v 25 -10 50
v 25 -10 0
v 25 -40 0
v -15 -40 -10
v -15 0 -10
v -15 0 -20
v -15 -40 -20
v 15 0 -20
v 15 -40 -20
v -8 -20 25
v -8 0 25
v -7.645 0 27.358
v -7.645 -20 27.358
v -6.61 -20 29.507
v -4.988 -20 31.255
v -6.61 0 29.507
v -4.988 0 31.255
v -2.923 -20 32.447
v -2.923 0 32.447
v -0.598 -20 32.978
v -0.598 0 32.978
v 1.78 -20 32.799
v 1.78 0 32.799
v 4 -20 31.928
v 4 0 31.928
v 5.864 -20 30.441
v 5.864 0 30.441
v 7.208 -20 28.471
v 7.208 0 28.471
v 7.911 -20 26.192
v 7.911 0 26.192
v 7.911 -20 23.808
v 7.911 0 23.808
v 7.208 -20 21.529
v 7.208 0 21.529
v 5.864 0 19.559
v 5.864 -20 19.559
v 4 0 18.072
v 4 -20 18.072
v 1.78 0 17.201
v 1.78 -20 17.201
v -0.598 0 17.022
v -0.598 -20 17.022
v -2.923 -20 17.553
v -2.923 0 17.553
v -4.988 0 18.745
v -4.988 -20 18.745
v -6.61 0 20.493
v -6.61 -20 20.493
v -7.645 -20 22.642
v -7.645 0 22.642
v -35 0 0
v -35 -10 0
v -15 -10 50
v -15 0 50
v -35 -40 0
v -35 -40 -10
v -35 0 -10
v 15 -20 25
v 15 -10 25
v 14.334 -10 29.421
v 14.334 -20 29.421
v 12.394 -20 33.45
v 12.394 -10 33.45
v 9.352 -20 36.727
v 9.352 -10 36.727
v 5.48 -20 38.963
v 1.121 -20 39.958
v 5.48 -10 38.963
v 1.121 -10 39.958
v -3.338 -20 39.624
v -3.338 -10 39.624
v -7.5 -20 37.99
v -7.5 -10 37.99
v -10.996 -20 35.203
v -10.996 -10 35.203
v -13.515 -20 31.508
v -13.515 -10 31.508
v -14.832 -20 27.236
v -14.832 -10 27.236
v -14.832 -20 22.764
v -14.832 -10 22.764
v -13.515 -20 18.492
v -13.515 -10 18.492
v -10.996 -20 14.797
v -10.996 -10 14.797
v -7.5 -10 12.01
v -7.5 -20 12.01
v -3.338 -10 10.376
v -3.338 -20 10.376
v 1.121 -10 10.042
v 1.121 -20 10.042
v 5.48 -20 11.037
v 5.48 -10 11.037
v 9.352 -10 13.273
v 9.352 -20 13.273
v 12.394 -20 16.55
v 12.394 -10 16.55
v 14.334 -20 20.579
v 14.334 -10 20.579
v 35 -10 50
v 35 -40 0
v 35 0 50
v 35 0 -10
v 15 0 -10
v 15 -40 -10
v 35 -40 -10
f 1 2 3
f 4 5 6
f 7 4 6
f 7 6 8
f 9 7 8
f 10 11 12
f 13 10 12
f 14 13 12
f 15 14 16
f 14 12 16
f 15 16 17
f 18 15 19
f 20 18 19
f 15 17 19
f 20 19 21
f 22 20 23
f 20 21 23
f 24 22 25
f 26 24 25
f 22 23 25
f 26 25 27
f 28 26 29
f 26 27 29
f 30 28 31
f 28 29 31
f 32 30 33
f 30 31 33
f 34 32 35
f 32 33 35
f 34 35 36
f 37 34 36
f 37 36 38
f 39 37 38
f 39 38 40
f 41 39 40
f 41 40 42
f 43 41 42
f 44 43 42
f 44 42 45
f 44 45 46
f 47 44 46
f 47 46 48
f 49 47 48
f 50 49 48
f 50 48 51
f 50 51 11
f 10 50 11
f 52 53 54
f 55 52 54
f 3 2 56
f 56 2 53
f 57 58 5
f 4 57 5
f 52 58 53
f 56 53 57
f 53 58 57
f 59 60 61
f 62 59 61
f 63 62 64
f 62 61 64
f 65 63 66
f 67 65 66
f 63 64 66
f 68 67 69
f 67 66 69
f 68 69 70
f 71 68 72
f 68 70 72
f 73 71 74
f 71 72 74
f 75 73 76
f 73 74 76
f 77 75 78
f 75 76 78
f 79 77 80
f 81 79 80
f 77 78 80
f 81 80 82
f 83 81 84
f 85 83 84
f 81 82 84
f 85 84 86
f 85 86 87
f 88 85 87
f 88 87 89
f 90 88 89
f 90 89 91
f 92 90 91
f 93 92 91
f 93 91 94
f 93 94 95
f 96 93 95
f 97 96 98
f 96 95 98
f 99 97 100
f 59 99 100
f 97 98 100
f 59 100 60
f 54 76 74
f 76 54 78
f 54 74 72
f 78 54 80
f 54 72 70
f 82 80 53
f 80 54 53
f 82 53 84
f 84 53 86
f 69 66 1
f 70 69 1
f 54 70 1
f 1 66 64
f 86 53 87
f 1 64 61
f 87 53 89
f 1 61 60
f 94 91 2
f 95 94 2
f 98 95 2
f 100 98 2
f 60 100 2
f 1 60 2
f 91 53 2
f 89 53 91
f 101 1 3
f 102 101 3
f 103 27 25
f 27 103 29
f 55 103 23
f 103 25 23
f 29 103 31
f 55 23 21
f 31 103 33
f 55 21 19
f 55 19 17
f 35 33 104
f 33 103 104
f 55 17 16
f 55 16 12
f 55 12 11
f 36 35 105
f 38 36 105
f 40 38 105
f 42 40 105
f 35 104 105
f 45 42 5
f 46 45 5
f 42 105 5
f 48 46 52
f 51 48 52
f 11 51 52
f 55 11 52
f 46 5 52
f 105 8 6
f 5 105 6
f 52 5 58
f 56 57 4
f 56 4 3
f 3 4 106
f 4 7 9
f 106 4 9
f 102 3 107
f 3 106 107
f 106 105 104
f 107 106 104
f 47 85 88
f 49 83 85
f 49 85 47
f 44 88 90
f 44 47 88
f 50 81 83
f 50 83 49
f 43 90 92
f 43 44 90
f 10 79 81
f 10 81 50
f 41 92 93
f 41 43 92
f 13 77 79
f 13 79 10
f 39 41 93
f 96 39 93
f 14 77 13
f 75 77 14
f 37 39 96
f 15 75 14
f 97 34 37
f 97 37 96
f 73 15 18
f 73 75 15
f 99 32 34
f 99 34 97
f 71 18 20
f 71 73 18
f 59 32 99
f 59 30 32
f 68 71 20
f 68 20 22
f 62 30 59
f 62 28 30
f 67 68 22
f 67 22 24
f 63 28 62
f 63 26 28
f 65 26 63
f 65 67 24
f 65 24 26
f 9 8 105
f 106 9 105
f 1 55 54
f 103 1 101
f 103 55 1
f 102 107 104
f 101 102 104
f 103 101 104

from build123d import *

# Parameters (mm, degrees)
F1_DEPTH = 40
F3_DEPTH = 50
F5_DEPTH = 10
F7_DEPTH = 10
F8_R     = 15
F9_DEPTH = 10
F11_D    = 16


with BuildPart() as f1:
    # F0 (on Front) → F1 (new body)
    with BuildSketch(Plane.XZ):
        Polygon((35, 0), (-35, 0), (-35, -10), (-15, -10), (-15, -20), (15, -20), (15, -10), (35, -10), align=None)
    extrude(amount=F1_DEPTH)

    # F2 (on face) → F3 (join)
    with BuildSketch(Plane.XY):
        Polygon((35, 0), (-35, 0), (-35, -10), (25, -10), (25, -40), (35, -40), align=None)
    extrude(amount=F3_DEPTH)

    # F4 (on face) → F5 (cut, through all)
    with BuildSketch(Plane.XZ.offset(10)):
        Polygon((-15, 50), (-35, 50), (-35, 0), align=None)
    extrude(amount=-F5_DEPTH, mode=Mode.SUBTRACT)

    # F6 (on face) → F7 (cut, through all)
    with BuildSketch(Plane(origin=(25, 0, 0), x_dir=(0, -1, 0), z_dir=(-1, 0, 0))):
        Polygon((40, 50), (10, 50), (40, 0), align=None)
    extrude(amount=-F7_DEPTH, mode=Mode.SUBTRACT)

    # F8 (on face) → F9 (join)
    with BuildSketch(Plane.XZ.offset(10)):
        with Locations((0, 25)):
            Circle(F8_R)
    extrude(amount=F9_DEPTH)

    # F11 (through all)
    with Locations(Plane.XZ.offset(20)):
        with Locations((0, 25)):
            Hole(F11_D / 2)


solid = f1.part
